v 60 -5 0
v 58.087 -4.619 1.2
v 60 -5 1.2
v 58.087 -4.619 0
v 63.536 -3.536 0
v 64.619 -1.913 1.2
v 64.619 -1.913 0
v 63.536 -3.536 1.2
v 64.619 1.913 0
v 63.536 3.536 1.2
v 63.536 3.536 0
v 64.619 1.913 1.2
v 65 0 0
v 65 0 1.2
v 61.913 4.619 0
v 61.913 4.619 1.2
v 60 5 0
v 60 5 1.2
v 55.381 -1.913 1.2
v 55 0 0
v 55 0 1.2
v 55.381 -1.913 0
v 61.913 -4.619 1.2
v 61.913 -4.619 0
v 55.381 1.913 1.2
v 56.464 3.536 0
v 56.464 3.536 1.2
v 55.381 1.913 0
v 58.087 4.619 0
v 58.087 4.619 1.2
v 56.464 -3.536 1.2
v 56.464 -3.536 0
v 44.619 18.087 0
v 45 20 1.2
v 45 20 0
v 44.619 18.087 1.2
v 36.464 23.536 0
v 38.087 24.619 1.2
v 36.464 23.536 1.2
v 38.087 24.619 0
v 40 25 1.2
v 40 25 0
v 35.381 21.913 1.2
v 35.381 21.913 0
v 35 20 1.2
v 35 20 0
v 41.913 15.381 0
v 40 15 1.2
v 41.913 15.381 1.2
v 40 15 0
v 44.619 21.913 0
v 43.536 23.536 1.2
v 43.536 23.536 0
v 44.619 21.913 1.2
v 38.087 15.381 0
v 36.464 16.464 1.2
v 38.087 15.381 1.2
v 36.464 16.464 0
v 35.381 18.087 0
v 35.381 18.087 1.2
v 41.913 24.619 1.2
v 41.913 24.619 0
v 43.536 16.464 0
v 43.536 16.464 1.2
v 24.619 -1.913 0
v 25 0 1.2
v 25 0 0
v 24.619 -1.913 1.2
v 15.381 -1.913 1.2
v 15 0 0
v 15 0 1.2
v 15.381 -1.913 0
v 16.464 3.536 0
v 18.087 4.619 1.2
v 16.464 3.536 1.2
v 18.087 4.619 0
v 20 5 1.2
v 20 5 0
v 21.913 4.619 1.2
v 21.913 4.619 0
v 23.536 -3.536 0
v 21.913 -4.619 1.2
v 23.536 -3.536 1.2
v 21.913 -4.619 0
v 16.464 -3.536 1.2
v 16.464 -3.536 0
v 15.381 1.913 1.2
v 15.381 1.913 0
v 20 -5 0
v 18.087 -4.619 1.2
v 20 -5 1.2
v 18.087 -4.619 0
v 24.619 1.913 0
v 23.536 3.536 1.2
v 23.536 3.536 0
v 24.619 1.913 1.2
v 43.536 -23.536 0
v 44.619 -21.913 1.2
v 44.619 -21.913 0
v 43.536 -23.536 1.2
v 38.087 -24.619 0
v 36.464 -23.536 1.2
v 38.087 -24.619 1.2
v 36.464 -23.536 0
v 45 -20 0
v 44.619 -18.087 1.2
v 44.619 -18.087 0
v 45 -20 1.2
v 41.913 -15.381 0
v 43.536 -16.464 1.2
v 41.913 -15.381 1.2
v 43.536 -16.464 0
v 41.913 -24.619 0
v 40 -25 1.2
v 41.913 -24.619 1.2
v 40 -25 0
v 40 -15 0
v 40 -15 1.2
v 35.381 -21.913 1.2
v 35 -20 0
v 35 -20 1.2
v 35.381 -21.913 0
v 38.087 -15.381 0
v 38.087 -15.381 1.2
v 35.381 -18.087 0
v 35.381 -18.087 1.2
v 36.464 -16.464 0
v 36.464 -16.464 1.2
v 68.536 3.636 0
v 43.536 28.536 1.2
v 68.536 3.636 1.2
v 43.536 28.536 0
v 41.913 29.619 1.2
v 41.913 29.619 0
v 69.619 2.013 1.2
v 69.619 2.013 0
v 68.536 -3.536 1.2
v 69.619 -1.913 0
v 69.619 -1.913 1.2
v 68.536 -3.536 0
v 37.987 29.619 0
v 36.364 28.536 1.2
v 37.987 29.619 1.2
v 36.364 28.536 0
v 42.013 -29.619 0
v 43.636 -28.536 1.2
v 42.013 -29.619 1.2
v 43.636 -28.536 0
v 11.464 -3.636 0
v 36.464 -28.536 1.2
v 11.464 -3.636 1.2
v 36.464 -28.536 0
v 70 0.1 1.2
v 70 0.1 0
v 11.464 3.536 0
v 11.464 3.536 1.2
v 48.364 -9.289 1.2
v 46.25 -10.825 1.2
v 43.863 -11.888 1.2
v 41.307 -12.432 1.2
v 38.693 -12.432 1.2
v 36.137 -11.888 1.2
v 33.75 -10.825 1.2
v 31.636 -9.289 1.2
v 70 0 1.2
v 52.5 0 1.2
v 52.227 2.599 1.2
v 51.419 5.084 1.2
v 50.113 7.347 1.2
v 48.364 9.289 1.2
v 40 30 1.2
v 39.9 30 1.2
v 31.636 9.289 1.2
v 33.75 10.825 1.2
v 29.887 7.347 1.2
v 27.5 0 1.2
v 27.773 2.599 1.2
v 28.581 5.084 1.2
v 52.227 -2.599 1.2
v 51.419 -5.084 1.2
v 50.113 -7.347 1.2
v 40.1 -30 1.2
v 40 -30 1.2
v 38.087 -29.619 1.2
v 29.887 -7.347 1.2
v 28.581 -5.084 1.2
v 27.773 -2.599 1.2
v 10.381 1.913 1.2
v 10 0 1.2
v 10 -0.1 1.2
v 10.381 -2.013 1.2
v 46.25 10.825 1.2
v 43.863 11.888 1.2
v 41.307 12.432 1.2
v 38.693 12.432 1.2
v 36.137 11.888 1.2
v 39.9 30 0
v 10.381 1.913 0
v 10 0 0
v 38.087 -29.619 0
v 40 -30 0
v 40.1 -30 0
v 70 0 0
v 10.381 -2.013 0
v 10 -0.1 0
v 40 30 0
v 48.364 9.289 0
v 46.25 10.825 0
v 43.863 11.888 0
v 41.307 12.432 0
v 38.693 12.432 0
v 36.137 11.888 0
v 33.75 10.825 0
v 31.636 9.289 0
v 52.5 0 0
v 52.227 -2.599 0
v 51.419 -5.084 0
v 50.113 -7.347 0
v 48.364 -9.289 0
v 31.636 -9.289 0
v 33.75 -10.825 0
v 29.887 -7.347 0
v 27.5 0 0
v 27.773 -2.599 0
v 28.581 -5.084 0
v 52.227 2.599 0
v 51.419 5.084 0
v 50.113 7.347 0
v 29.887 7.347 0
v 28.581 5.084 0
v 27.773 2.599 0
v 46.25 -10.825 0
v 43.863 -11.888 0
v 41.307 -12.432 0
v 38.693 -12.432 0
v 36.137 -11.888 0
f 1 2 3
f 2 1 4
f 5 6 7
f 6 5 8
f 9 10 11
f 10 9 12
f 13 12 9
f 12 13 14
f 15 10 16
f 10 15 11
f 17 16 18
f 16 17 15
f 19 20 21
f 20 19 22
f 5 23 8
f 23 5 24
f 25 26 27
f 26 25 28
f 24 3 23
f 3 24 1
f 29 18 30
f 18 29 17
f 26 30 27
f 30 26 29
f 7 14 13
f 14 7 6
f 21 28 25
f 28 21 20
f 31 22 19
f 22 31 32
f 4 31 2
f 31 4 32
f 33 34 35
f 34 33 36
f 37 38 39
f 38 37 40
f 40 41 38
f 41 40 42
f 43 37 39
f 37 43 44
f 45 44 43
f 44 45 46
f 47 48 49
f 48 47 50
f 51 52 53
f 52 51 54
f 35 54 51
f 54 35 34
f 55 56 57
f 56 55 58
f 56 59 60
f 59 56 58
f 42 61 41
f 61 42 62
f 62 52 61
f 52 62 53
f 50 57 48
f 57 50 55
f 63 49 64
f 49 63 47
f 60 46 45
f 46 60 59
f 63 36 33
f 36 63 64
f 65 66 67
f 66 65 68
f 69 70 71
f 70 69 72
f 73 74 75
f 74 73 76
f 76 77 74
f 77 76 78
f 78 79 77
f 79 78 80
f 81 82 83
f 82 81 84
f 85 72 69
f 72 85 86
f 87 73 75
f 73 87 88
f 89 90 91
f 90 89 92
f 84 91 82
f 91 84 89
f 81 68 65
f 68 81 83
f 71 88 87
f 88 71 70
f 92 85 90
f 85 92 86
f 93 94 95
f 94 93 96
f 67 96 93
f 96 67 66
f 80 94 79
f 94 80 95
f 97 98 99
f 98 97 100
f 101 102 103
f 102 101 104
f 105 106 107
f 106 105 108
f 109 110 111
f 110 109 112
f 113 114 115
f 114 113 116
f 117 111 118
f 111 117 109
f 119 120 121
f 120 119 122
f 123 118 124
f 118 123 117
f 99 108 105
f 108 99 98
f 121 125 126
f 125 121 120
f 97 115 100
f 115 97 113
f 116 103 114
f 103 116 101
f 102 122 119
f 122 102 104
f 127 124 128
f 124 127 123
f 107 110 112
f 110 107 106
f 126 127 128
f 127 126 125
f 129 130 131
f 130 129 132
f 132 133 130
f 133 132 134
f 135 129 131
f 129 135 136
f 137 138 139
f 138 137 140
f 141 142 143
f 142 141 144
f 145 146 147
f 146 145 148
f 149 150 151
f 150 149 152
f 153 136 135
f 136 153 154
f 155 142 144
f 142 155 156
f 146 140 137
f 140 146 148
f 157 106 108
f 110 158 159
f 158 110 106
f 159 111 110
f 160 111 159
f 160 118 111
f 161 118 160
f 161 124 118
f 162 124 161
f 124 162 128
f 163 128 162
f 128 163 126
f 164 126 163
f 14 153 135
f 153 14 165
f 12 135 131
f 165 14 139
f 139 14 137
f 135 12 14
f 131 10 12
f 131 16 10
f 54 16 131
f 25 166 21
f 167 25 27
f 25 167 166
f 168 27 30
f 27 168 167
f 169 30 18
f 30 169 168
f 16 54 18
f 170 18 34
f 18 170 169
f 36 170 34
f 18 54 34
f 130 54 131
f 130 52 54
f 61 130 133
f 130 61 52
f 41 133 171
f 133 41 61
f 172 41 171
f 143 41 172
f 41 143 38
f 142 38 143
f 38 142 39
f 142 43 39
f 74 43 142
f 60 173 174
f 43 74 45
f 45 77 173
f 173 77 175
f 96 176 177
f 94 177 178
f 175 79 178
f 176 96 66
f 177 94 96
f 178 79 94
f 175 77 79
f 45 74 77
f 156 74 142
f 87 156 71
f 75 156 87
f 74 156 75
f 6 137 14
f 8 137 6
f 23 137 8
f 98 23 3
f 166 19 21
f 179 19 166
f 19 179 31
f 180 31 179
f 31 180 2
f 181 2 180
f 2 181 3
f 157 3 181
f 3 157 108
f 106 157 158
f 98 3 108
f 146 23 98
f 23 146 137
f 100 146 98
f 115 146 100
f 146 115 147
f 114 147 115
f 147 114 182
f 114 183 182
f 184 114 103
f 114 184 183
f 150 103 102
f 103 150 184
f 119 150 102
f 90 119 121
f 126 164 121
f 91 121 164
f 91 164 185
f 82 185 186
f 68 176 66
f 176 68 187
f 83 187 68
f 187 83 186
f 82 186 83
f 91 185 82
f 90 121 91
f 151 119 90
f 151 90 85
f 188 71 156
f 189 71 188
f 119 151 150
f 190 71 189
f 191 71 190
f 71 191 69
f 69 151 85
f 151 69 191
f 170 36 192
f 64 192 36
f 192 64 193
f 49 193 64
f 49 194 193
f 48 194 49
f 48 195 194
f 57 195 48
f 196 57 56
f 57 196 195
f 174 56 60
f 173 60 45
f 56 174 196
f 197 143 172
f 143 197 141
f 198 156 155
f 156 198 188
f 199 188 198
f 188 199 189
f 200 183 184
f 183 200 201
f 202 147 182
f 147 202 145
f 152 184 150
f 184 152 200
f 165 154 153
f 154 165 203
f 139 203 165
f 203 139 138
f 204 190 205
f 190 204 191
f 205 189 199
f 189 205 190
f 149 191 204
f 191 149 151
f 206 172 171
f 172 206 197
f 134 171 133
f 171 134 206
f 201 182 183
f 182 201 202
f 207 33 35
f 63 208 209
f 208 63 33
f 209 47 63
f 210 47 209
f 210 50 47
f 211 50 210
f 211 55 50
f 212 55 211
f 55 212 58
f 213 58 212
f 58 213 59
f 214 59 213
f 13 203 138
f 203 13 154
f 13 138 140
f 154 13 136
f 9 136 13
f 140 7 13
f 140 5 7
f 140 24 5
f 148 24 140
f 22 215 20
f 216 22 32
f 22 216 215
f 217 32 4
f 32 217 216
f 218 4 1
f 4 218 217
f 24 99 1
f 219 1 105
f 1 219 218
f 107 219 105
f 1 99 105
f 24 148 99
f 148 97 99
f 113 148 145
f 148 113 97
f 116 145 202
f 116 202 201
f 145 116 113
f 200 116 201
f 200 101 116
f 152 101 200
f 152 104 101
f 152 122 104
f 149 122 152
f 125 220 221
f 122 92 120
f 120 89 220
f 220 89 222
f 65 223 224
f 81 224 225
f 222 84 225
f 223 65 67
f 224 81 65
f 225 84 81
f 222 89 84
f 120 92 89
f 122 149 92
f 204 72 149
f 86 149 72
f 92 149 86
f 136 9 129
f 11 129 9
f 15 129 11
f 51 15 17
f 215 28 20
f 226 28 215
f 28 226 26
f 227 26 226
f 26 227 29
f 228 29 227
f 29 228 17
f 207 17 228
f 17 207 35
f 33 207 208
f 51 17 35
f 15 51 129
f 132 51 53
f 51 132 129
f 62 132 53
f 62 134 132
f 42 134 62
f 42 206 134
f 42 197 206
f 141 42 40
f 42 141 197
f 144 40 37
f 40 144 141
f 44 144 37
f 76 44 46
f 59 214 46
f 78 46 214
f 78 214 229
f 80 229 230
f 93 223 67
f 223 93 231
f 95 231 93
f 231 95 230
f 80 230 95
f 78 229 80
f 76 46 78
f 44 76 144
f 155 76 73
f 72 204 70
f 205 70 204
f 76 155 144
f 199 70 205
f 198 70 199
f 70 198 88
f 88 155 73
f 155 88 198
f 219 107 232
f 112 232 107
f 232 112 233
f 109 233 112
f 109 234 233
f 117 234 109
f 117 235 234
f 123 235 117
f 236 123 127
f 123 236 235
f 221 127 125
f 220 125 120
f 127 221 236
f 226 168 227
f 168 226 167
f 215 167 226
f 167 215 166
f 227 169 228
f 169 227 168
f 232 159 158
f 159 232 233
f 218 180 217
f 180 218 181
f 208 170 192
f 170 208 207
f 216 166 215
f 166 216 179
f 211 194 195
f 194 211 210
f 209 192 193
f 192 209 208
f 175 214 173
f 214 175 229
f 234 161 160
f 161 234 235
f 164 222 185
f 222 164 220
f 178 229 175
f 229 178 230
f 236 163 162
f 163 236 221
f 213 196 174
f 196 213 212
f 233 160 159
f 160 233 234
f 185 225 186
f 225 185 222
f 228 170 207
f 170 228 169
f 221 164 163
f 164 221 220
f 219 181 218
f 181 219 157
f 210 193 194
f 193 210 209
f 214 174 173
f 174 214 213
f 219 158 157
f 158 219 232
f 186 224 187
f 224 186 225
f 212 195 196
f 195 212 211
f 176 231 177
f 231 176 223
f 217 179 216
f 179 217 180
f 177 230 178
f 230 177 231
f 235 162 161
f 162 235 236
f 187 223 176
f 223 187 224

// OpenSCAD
height=.6;
//no more then 12 with a length of 50. and a yarnholeR of 5. Give it smaller yarnholes or make it longer.
points=4;
//not counting the bevel, which add ~1cm. Wouldn't be hard to change the code to take into account the bevel, but meh.
length=50;
//5mm = 1cm
yarnholeR=5;
//Feel free to set this manually, But those are some quick setting that should automatically generate a more or less correctly sized hole. With the defaults it's "12.5mm". Double that and you see that the hole is 25mm across. Or 2.5cm
middleholeR=length/2-(yarnholeR*2)-2.5;

//5 is a sane default. For any significant changes you're probably going to need to make changes to the minkowski sum length.
bevel=5;

//If you need to make any changes, it might be better to just rewrite it... Not my cleanest code

//This will cut out all the holes, after minkowski closes
difference(){
	//makes the beveling happen.
	minkowski()
	{
		//This hull generates the basic shape
		hull()
		{
			union()
			{
			cylinder(h = height, r=middleholeR+0.5);
				for ( i = [0 : points] )
				{
				rotate( i * 360 / points, [0, 0, 1])
				//I can use 0.1 for the width, becouse it's all going to be hulled together. The smaller that is the more accurate, but it can't actually be zero for some reason. That should only result in a 0,1mm inaccuracy.
				cube(size = [length/2, 0.1, height]);
				}
			}
		}
		//The hull ends and we create the rounded corners using minkowski
		translate(v = [40, 0, 0]) 
		{
			cylinder(h = height, r=bevel);
		}
	}
	//minkowski ends so we can have nice clean holes, we use a for loop to cut a hole at every point.
	for ( i = [0 : points] )
	{
		translate(v = [40, 0, -1]) 
		{
			rotate( i * 360 / points, [0, 0, 1])
				//Puts the yarn hole -yarhholeR from the edges, not counting the bevel.
				translate(v = [length/2-yarnholeR, 0, -1]) 
				{
					cylinder(h = height+50, r=yarnholeR);
				}
		}
	}
	//cuts the center hole out. If you want something fancier then just a big hole, put it here.
	translate(v = [40, 0, -1]) 
	{
		cylinder(h = height+4, r=middleholeR);
	}
}
